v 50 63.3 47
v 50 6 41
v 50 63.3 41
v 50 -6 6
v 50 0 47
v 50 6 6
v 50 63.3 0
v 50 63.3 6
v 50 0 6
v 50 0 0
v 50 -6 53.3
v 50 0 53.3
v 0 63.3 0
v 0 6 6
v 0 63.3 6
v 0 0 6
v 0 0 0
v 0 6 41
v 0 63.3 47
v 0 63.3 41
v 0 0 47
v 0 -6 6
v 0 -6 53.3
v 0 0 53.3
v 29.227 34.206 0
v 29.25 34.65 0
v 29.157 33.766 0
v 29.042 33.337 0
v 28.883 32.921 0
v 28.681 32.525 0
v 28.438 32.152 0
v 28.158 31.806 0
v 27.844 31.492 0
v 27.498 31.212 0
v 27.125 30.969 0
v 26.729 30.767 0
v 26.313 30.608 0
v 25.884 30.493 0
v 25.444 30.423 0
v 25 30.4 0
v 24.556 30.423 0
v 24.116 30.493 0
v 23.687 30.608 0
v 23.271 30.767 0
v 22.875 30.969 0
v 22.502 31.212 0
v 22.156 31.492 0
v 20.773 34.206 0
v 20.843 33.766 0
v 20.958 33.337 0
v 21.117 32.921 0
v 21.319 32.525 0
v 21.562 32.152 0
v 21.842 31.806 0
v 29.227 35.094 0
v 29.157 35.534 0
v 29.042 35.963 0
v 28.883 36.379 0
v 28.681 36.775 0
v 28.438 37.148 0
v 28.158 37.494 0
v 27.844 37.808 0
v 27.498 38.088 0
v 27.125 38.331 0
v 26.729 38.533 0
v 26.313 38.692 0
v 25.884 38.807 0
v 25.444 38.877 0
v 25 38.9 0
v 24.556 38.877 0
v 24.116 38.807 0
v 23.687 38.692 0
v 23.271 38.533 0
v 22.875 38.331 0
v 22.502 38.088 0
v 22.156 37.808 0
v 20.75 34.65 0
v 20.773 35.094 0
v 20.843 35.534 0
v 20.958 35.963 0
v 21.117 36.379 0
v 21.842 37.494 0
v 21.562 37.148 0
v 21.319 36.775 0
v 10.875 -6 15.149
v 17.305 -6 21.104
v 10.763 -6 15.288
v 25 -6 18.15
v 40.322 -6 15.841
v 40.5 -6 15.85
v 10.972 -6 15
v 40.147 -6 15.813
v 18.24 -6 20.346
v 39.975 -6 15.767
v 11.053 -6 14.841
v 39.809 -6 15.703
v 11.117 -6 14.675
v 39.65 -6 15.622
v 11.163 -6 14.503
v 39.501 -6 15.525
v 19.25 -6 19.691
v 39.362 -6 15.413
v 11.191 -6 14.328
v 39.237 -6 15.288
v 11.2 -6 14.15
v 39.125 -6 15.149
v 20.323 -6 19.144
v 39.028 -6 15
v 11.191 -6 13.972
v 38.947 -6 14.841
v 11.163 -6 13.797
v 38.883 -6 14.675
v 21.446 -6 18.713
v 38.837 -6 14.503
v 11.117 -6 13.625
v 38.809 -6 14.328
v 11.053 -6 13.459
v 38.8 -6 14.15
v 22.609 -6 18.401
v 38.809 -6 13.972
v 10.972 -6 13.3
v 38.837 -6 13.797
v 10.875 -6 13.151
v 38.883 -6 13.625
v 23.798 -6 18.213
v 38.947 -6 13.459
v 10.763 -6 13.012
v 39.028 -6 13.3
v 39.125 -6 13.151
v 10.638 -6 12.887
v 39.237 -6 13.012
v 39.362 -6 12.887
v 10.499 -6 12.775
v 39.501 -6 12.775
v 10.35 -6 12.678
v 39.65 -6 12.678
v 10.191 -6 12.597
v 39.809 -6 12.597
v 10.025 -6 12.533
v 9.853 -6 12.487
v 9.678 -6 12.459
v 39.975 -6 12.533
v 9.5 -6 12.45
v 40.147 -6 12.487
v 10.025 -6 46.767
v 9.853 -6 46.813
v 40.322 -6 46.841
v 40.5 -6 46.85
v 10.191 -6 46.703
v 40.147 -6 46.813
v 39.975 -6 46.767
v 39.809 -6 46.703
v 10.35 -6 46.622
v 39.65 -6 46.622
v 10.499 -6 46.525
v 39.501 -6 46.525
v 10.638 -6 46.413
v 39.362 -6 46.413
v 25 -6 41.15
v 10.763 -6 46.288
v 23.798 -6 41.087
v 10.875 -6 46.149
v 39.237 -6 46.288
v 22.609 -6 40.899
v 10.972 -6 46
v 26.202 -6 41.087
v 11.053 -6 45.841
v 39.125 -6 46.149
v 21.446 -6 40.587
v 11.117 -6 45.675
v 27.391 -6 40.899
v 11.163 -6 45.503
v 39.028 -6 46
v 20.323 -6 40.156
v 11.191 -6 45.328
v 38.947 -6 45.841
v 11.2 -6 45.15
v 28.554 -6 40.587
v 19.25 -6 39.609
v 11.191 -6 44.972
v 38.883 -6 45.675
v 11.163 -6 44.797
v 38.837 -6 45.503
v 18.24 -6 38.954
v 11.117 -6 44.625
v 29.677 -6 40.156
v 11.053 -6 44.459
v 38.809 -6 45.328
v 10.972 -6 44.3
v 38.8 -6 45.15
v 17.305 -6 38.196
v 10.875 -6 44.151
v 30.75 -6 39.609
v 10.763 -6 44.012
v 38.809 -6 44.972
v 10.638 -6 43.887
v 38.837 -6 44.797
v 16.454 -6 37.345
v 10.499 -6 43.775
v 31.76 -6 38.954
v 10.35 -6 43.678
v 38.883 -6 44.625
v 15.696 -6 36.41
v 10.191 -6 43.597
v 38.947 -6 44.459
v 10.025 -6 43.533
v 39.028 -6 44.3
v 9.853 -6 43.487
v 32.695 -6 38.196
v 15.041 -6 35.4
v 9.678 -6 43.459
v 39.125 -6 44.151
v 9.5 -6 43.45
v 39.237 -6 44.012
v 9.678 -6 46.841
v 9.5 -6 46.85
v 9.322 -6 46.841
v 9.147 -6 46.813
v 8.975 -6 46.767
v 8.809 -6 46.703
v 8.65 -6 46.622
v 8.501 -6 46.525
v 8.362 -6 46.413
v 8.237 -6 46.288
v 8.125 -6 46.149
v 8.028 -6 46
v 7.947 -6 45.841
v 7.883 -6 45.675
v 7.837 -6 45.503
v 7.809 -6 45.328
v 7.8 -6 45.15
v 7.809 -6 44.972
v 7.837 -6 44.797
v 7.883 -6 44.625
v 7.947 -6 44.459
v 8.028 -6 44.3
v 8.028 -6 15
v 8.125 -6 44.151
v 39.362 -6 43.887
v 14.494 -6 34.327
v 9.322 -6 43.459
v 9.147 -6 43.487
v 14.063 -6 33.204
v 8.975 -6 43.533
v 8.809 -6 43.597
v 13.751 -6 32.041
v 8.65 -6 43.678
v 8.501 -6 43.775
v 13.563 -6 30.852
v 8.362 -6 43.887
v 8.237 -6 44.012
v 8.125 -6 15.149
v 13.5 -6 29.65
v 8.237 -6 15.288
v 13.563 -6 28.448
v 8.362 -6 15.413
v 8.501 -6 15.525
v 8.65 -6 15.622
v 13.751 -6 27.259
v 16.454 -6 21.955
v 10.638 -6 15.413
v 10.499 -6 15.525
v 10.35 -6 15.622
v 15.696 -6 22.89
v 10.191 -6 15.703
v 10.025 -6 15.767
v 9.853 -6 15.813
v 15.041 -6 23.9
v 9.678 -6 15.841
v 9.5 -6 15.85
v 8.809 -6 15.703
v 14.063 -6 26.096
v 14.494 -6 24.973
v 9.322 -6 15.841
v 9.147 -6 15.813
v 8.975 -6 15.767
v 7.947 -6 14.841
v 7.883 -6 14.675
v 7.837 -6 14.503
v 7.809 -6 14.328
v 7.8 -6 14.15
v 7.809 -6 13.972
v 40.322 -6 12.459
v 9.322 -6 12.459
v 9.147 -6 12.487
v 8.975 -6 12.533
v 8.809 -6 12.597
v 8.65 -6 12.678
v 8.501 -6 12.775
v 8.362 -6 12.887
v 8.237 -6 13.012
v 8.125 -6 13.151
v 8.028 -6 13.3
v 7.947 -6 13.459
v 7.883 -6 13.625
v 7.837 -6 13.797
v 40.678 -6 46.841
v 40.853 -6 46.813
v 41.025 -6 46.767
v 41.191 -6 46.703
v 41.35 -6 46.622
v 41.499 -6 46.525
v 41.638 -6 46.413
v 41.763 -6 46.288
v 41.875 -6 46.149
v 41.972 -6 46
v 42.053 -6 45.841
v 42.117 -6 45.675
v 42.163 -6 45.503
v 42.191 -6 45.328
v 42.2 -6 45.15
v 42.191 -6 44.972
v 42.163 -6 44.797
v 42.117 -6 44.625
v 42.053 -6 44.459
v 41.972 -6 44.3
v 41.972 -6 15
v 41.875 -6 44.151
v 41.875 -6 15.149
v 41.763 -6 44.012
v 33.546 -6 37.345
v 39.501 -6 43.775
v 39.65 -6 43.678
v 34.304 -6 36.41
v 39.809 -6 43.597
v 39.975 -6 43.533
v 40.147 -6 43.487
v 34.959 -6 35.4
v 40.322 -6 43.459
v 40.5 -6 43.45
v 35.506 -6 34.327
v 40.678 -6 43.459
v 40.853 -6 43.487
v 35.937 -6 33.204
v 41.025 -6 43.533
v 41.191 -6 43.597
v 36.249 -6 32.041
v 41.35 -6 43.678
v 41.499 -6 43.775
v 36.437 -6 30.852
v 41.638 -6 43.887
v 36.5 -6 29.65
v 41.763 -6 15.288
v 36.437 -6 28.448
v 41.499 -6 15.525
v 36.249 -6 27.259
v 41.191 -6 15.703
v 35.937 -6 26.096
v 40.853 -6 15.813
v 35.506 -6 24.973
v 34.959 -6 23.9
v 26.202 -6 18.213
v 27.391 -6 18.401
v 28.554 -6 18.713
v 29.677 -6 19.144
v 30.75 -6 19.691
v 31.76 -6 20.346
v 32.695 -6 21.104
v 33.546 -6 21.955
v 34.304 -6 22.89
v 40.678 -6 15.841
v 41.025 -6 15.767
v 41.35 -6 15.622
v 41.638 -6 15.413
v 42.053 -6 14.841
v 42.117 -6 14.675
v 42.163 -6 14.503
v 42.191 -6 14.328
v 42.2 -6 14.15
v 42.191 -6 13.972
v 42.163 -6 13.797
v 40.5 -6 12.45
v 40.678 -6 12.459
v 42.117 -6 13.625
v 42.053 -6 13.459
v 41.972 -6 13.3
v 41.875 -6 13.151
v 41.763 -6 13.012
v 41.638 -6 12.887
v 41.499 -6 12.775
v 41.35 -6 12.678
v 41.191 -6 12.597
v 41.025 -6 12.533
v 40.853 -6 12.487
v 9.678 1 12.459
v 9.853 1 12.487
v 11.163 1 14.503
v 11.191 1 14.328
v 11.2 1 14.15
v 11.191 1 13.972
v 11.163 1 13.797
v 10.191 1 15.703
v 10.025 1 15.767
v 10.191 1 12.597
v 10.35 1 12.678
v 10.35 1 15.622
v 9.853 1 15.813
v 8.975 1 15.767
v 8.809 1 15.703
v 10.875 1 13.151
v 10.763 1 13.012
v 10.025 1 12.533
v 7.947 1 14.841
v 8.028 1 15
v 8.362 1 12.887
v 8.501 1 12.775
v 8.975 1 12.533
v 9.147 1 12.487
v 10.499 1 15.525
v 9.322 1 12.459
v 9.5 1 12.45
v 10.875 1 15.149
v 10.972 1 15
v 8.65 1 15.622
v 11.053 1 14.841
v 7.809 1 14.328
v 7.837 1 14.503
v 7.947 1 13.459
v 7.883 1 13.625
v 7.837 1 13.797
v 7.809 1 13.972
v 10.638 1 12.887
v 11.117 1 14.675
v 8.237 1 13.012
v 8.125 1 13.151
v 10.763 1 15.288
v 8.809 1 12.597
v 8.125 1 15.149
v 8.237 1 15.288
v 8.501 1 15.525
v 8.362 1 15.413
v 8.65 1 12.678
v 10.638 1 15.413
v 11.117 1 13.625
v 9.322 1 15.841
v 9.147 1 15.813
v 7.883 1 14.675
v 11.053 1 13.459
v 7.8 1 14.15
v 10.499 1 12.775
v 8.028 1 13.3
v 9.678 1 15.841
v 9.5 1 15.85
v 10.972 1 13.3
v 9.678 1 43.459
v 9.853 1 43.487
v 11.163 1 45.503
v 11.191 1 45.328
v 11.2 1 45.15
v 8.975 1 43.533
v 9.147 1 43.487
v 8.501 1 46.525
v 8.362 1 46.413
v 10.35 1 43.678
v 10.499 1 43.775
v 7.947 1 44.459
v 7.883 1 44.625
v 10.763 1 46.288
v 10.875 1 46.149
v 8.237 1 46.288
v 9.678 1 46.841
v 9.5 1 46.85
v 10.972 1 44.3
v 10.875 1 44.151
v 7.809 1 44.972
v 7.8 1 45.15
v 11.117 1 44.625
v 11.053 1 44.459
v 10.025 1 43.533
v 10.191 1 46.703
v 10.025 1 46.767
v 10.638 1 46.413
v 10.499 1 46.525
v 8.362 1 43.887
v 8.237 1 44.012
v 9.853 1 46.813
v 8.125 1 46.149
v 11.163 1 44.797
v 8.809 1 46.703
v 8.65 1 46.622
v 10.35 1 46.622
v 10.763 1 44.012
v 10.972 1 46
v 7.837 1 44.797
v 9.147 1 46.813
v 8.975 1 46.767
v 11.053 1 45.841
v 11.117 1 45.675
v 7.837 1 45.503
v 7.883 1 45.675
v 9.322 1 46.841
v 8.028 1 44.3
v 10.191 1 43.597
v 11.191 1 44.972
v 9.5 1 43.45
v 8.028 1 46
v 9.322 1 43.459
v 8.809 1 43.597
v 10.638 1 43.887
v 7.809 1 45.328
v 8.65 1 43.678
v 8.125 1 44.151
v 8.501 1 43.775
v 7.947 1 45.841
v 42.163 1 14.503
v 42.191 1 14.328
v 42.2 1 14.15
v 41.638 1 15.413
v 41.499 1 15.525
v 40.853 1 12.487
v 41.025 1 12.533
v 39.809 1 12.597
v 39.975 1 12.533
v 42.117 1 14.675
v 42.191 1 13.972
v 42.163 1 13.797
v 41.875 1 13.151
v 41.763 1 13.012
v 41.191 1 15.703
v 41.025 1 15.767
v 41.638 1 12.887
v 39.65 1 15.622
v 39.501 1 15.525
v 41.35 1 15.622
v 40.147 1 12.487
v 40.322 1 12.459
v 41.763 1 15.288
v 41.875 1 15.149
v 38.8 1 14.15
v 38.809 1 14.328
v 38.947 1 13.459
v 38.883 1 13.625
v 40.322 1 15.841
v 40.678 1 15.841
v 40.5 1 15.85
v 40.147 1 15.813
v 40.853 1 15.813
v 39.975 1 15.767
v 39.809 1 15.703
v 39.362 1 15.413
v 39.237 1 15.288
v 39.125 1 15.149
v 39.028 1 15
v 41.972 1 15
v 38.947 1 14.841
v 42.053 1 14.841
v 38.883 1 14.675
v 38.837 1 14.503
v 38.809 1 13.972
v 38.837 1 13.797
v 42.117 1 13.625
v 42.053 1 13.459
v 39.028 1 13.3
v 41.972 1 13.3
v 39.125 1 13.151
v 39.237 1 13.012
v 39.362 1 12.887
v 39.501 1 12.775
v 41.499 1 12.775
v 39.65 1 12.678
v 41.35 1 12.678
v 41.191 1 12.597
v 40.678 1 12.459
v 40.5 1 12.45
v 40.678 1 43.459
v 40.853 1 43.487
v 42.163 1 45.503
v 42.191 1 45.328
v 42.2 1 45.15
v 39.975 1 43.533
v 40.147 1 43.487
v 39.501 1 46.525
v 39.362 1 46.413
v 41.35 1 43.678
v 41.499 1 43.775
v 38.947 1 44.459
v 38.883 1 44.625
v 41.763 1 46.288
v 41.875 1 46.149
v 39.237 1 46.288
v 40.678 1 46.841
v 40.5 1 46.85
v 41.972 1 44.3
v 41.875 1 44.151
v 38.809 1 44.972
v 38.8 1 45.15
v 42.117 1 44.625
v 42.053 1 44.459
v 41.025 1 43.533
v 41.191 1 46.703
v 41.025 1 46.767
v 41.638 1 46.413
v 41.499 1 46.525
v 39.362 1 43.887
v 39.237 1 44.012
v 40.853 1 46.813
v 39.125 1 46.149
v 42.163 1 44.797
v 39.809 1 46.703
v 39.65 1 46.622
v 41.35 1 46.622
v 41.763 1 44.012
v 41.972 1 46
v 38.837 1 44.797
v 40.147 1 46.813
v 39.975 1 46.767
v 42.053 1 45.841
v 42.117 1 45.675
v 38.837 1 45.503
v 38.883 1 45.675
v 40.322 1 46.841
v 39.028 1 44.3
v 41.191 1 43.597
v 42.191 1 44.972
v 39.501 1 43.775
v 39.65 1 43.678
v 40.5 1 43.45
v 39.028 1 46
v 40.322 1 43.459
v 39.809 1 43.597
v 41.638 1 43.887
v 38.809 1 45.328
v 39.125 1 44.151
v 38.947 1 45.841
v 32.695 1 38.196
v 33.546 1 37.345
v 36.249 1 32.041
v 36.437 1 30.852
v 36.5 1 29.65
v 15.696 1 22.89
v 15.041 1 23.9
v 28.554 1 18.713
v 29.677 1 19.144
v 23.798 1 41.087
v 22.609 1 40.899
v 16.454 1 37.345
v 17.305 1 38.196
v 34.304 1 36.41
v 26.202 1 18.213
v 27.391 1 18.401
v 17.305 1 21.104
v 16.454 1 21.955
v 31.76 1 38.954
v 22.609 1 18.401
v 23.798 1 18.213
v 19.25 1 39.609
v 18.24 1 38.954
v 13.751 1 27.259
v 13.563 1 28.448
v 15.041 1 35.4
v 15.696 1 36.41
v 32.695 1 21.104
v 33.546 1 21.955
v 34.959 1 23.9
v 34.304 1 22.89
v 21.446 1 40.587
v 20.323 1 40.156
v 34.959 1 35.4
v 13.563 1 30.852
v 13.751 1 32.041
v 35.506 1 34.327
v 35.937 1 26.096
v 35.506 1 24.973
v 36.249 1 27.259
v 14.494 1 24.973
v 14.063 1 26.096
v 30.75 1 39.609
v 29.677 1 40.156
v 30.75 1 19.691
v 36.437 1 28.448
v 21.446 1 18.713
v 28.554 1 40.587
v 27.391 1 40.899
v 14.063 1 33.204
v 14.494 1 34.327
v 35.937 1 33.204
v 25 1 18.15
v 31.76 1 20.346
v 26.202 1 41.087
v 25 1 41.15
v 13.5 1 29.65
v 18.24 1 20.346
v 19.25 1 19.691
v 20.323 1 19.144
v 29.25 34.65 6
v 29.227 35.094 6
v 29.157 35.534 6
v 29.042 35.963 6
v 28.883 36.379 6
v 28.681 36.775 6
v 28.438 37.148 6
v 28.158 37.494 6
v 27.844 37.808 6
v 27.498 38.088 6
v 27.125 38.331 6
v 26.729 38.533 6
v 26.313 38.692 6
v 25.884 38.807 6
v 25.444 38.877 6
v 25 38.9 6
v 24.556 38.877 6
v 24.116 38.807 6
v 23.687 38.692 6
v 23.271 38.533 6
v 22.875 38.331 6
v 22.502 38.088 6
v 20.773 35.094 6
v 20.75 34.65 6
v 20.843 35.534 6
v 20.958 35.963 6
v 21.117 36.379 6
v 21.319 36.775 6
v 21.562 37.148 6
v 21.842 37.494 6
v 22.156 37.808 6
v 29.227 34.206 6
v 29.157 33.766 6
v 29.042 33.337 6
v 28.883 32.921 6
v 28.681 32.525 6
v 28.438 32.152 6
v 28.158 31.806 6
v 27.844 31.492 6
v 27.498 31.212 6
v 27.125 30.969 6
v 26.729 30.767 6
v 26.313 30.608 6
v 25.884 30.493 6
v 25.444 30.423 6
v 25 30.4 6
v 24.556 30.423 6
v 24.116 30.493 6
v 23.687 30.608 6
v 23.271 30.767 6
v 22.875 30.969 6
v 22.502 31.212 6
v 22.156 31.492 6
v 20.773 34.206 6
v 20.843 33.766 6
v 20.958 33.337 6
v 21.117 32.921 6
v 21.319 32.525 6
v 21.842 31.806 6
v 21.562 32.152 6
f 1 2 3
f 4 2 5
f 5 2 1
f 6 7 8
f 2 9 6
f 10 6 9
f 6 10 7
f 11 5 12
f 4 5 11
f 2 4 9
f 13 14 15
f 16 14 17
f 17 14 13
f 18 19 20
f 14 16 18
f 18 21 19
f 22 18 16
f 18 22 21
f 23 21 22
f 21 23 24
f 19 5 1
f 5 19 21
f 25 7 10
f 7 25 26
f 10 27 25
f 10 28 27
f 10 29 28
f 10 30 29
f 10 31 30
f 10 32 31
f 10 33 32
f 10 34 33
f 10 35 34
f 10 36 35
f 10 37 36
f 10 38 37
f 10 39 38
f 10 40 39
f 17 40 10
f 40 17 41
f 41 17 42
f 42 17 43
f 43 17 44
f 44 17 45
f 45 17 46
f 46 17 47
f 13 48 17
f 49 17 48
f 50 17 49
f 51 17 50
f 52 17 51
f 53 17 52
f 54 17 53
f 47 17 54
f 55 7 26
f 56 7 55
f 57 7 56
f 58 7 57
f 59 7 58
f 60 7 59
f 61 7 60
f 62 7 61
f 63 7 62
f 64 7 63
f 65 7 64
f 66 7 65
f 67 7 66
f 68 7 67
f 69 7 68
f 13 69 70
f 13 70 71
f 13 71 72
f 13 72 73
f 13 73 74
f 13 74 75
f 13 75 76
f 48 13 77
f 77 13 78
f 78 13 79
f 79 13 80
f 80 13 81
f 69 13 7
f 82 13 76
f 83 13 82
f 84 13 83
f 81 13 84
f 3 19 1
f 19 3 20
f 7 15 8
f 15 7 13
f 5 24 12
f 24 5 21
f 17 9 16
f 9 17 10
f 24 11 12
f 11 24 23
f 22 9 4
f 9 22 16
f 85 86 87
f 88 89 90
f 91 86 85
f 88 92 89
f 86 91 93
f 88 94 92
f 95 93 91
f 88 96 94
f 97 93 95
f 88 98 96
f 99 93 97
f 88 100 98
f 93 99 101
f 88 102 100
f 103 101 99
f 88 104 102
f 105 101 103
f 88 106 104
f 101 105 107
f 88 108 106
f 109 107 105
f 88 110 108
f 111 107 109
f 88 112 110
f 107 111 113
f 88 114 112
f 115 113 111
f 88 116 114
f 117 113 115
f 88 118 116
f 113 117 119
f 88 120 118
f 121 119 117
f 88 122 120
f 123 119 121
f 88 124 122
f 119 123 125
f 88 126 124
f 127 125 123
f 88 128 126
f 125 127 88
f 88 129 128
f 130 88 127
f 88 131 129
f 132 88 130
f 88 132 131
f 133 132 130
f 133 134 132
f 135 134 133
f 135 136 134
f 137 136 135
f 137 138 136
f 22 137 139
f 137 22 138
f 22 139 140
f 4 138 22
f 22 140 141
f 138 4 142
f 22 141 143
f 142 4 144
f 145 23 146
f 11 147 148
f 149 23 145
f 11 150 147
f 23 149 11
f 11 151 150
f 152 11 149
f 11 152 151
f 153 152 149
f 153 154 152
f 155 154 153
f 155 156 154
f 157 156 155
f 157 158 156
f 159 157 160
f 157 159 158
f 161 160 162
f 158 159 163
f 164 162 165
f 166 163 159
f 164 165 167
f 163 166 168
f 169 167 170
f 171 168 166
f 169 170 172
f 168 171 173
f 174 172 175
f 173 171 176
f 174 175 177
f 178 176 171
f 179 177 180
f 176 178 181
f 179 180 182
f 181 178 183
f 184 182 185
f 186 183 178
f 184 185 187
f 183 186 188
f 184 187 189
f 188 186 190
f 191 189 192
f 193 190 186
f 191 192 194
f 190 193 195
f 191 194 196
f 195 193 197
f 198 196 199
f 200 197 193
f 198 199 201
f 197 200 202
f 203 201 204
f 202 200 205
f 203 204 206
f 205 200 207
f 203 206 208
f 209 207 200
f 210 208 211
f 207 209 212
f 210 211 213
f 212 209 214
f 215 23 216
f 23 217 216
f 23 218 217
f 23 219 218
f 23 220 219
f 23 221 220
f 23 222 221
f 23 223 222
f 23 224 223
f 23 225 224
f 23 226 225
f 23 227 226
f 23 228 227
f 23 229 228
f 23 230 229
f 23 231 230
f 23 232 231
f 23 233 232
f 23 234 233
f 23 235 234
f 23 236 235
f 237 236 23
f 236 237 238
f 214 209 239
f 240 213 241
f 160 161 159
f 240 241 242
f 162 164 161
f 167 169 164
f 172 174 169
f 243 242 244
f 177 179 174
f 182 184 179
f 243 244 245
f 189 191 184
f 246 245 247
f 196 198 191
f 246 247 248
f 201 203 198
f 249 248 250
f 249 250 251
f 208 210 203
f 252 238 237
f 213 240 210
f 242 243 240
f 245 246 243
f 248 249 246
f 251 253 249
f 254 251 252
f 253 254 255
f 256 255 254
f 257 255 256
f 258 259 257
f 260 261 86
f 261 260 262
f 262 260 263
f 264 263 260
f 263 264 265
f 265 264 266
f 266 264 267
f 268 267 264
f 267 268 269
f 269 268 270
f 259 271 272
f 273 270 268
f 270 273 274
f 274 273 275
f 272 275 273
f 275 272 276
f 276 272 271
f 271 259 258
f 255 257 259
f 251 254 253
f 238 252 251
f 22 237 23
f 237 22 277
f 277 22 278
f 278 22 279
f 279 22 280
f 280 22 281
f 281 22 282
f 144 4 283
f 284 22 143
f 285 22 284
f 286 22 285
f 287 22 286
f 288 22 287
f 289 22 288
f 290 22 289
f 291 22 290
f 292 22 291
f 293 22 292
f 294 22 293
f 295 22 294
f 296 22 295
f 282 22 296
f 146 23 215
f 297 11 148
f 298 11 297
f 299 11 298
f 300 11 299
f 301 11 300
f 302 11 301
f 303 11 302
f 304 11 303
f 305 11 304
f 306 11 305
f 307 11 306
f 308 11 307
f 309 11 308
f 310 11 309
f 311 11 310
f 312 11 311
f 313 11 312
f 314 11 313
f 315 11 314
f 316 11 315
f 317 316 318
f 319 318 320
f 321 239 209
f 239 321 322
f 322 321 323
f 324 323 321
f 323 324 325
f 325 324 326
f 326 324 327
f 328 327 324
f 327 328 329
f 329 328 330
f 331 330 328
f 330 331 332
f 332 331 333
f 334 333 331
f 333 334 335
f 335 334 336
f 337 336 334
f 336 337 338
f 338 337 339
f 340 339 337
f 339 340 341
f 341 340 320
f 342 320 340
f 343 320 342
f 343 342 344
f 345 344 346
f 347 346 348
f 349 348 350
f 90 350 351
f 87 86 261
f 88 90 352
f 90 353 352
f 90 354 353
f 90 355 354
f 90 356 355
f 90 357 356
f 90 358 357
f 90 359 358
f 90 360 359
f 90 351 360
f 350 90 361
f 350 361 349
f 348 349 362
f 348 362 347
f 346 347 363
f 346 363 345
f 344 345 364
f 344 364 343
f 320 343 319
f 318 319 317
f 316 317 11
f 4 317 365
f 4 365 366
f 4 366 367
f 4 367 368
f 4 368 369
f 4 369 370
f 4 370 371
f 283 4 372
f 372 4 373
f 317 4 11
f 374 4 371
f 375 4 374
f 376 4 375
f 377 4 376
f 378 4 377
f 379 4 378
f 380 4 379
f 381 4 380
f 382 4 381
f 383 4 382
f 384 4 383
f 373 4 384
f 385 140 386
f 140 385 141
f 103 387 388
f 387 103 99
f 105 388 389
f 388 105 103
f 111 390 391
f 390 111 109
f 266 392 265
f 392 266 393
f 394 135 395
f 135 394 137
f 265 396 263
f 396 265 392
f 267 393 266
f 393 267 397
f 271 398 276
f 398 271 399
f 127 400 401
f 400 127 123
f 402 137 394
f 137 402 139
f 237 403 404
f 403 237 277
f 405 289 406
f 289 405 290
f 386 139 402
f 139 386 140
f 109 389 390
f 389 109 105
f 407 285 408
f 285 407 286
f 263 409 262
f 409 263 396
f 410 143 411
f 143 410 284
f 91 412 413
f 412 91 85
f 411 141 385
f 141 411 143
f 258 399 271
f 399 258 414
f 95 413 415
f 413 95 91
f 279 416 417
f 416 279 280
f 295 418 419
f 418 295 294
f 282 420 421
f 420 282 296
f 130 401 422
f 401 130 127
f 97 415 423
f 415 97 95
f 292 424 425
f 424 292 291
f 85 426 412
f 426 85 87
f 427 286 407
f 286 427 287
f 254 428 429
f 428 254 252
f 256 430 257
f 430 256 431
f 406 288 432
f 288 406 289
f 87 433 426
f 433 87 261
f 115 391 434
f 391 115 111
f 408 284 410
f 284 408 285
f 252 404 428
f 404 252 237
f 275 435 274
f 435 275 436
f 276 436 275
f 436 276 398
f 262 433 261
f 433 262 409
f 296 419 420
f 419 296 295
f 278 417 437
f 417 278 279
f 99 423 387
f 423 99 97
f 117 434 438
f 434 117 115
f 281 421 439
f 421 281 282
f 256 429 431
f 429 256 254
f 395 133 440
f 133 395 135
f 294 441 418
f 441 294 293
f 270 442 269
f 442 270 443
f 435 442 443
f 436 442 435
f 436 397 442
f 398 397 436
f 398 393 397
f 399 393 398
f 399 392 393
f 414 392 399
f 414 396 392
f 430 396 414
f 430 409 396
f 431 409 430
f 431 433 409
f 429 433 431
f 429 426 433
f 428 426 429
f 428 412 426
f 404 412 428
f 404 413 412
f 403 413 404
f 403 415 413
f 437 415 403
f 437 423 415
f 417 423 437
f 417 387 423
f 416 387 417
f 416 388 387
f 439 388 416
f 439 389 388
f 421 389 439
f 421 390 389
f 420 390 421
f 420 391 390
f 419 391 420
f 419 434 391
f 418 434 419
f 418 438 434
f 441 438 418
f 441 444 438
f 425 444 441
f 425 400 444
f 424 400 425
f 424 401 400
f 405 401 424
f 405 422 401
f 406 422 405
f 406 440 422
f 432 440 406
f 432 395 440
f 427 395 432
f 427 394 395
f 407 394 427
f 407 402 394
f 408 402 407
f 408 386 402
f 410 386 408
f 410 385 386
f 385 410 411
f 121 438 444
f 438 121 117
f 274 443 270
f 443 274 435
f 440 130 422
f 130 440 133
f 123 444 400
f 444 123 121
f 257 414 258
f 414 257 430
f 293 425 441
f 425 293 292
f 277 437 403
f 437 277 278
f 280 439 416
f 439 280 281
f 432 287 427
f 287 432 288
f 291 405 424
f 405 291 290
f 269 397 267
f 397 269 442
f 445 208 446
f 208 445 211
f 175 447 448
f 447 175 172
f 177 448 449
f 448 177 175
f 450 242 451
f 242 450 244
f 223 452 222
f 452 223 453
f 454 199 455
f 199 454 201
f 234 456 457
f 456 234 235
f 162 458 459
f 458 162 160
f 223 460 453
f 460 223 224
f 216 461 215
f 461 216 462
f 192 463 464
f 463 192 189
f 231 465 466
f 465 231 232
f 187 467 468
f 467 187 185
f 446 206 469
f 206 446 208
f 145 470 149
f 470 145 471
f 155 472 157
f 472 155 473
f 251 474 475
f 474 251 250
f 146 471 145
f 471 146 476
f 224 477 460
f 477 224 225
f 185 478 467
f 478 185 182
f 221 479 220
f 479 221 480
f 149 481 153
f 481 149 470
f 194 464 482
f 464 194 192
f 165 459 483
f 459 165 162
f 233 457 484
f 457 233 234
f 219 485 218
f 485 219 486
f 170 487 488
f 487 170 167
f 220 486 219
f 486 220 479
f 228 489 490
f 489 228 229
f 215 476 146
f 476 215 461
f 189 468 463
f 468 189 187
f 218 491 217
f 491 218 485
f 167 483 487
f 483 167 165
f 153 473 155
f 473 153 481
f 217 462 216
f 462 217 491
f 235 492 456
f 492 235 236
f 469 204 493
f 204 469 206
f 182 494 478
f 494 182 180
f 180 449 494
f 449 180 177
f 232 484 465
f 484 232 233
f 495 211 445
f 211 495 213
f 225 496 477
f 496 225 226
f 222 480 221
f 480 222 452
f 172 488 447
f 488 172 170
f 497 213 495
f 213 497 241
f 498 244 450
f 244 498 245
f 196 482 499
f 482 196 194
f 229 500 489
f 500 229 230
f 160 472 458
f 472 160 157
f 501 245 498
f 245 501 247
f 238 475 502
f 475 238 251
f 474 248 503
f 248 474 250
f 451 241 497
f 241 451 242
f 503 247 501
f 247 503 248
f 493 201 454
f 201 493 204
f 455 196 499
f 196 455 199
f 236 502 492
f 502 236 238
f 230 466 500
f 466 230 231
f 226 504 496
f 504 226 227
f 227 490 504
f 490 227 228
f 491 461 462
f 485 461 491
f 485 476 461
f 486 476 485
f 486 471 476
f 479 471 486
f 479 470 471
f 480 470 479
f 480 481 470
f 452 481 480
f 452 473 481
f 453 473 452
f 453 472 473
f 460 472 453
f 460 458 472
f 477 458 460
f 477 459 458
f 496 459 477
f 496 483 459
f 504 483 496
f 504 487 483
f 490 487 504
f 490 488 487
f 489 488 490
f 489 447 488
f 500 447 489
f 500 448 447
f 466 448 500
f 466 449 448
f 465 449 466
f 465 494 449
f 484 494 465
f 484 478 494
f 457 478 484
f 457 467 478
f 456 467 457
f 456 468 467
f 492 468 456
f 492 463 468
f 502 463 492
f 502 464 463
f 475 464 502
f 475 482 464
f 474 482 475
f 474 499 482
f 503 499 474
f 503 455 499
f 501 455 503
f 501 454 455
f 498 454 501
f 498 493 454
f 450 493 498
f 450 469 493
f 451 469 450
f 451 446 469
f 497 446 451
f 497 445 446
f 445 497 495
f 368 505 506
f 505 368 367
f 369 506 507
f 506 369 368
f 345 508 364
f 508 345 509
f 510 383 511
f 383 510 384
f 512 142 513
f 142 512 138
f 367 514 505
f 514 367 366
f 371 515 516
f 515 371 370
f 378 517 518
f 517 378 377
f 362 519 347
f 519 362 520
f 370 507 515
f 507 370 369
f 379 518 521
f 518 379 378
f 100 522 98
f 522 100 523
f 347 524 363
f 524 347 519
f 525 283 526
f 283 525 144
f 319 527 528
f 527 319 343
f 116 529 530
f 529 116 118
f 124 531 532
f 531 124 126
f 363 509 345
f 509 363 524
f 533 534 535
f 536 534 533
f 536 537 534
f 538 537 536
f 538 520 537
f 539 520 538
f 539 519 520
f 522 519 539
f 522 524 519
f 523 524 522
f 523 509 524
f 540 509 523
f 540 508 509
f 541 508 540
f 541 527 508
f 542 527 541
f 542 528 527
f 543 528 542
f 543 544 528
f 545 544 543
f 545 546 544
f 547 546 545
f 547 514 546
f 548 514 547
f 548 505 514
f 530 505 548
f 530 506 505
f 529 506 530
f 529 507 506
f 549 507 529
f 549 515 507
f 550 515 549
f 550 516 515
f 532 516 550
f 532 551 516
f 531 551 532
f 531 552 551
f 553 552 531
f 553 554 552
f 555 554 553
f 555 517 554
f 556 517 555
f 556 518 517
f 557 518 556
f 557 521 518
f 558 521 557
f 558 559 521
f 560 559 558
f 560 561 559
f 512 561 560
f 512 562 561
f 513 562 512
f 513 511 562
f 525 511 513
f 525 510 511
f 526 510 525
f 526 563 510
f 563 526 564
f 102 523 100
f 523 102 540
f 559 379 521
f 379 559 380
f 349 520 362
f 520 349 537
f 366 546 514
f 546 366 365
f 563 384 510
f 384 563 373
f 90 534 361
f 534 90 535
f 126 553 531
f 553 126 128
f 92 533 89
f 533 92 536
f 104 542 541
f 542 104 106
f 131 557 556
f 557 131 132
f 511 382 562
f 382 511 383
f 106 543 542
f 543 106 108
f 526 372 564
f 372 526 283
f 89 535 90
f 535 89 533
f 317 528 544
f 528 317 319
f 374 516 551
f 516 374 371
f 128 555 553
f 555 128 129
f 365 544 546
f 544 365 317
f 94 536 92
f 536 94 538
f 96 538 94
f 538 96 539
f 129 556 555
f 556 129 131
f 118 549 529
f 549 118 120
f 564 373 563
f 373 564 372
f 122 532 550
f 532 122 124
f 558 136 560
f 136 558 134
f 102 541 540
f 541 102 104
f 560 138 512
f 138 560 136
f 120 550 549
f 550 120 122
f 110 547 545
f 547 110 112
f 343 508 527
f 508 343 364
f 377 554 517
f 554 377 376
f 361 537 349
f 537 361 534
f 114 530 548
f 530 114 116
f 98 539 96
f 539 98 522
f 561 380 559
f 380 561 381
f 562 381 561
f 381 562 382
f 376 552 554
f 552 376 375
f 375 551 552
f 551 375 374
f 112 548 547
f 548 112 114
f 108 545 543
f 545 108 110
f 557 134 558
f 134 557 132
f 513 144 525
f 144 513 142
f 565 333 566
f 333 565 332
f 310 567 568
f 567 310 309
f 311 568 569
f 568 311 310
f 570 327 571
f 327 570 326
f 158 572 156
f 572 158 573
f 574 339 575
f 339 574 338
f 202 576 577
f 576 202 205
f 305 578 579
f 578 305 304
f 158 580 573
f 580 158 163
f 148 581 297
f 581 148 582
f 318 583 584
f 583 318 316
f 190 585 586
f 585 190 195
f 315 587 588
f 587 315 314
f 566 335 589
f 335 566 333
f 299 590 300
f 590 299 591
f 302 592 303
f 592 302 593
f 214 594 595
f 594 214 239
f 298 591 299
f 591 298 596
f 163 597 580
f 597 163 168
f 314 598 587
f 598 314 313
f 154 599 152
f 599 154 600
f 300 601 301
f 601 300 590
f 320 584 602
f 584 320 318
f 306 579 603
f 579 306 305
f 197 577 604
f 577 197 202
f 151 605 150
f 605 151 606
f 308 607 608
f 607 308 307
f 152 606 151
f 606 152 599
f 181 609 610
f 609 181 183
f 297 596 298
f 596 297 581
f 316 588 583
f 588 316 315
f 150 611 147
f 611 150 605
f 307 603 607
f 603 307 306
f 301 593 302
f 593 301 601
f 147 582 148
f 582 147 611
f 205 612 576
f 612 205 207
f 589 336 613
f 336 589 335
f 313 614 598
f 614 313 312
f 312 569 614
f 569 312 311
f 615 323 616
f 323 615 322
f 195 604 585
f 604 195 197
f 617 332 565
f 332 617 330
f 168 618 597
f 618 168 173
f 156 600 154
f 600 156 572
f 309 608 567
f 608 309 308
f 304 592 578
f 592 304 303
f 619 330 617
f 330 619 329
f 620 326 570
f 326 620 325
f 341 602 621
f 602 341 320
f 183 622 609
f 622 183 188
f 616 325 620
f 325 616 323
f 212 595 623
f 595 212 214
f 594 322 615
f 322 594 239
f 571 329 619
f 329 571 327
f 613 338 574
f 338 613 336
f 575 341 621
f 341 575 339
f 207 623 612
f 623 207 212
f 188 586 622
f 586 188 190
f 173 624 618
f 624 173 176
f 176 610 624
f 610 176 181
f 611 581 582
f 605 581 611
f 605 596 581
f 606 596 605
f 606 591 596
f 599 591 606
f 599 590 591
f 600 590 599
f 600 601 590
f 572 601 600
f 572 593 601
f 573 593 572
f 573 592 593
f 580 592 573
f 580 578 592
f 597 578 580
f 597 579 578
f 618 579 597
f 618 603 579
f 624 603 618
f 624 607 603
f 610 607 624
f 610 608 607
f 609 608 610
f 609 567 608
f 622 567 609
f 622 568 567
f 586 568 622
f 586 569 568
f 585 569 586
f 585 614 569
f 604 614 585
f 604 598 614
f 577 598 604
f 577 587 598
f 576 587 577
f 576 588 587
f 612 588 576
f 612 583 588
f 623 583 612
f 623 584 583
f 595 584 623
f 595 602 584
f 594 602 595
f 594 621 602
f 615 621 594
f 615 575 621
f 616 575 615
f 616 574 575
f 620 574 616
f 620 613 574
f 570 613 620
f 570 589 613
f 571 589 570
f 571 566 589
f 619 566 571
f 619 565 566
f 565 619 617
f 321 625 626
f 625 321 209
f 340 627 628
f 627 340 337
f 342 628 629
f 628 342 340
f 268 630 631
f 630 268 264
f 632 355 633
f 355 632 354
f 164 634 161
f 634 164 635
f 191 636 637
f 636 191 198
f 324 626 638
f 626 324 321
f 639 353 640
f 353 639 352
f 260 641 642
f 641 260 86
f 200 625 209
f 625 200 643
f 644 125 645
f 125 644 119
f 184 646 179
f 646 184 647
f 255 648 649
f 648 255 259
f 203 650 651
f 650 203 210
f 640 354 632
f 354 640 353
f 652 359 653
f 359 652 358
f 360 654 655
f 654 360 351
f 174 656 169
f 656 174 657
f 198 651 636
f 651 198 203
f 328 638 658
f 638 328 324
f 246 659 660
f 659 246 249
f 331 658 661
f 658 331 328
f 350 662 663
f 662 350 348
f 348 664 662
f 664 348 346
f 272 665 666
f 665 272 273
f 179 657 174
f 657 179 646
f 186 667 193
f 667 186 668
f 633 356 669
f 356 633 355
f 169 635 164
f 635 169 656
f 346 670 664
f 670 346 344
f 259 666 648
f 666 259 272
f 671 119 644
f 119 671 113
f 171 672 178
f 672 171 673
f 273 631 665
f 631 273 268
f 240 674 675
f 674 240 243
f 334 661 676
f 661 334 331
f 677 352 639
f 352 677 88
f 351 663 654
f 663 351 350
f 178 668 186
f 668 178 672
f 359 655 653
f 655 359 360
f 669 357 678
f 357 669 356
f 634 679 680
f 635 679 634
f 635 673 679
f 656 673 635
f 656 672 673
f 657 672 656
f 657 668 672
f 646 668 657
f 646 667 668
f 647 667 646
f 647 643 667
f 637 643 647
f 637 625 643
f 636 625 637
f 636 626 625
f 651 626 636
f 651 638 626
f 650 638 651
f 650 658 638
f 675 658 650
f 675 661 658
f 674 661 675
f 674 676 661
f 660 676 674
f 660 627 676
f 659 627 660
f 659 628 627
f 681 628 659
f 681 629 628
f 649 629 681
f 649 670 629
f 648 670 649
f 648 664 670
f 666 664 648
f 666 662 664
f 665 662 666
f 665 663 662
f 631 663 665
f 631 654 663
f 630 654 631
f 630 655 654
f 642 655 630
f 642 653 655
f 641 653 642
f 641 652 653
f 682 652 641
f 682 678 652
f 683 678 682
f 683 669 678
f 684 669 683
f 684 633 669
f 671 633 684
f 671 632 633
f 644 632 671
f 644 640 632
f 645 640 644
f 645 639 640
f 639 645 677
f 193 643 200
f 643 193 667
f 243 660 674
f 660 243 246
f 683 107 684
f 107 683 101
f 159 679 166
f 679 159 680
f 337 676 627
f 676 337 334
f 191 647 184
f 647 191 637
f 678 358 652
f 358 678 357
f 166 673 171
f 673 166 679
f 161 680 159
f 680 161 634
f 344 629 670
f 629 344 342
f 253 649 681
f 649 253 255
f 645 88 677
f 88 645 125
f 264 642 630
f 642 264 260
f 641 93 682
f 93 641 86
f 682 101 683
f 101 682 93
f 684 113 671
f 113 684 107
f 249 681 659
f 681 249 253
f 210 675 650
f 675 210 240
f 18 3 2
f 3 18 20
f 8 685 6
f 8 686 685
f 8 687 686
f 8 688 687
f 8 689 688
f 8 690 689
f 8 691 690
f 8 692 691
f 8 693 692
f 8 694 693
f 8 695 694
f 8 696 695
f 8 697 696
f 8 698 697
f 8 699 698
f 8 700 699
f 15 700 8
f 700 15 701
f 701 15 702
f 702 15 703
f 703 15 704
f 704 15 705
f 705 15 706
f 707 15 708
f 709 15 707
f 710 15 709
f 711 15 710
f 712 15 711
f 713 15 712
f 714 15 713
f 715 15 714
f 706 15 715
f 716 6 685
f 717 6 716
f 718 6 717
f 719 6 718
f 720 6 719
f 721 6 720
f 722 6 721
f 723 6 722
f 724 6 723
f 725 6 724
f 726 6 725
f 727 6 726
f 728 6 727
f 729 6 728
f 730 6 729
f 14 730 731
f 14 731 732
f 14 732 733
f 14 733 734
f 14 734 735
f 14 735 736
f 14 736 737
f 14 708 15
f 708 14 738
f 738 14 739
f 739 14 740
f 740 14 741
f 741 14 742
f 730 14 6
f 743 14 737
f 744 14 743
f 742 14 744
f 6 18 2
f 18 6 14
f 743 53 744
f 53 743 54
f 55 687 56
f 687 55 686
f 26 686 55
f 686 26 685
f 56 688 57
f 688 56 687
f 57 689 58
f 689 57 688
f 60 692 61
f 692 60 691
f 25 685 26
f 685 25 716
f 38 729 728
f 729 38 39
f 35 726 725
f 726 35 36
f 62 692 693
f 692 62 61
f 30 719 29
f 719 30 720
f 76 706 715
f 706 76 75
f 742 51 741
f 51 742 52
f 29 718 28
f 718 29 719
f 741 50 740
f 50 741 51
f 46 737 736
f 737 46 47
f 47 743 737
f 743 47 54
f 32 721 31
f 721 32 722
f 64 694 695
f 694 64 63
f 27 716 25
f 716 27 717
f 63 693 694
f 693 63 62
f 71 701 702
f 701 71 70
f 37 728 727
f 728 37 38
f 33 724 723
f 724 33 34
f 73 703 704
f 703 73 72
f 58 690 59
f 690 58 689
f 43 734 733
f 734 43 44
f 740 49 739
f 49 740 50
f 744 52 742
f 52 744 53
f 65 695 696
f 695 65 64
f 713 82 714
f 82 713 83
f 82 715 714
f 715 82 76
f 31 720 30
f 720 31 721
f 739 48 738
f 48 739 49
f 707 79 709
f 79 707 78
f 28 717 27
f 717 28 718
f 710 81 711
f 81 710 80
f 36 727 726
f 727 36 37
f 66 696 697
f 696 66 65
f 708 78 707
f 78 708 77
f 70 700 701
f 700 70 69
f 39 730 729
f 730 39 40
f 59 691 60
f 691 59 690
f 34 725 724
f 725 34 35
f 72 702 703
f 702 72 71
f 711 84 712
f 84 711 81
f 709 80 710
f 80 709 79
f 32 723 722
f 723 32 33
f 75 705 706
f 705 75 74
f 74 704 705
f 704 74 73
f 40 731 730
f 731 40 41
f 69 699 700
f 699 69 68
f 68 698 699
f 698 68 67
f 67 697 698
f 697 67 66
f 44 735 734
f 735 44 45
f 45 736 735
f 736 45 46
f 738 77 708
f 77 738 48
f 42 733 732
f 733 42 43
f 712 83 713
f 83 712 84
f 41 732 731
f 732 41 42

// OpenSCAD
// ============================================================
// GÁ KẸP BÀN ĐỘNG CƠ NEMA 17 (NẰM NGANG)
// Thiết kế tối ưu cho in 3D (không cần support khi đặt nằm nghiêng)
// ============================================================

/* --- HƯỚNG DẪN ---
1. Điều chỉnh thông số "ban_day_max" cho phù hợp với bàn của bạn.
2. Khi in 3D: Xoay vật thể 90 độ quanh trục Y (để mặt bên áp xuống bàn in).
   Điều này giúp in không cần support và kết cấu cứng nhất.
3. Bạn cần chuẩn bị:
   - 4 ốc M3 ngắn để bắt motor vào gá.
   - 1 bu lông lớn (M8 hoặc M10) + đai ốc để làm chân kẹp.
*/

// --- THÔNG SỐ CẤU HÌNH (Đơn vị: mm) ---

// Thông số bàn và kẹp
ban_day_max = 35;       // Độ dày tối đa của mặt bàn có thể kẹp
do_day_tuong = 6;       // Độ dày của thành gá (nên để >= 5mm cho cứng)
be_rong_ga = 50;        // Bề rộng tổng thể của gá
duong_kinh_oc_kep = 8.5; // Đường kính lỗ cho ốc kẹp (Ví dụ M8 thì để 8.5mm cho lỏng)

// Thông số chuẩn NEMA 17 (Không nên sửa trừ khi dùng motor lạ)
nema_side = 42.3;       // Kích thước cạnh mặt bích motor
lo_bat_oc_motor = 31;   // Khoảng cách tâm 2 lỗ ốc đối diện (chéo) là 43.8, cạnh là 31
duong_kinh_hub = 23;    // Đường kính lỗ thoát gờ định vị giữa motor (chuẩn 22mm, để 23 cho lỏng)
duong_kinh_oc_m3 = 3.4; // Lỗ xỏ vừa ốc M3

$fn = 60; // Độ mịn đường tròn

// ============================================================
// MODULE CHÍNH
// ============================================================

module ga_kep_ban_nema17() {
    // Tính toán các kích thước bao
    chieu_cao_tong = ban_day_max + 2 * do_day_tuong;
    chieu_sau_kep = nema_side + 15; // Phần ăn vào mặt bàn

    difference() {
        // 1. Khối vật liệu chính (Hình chữ C)
        union() {
            // Khối thân chính
            cube([be_rong_ga, chieu_sau_kep + do_day_tuong, chieu_cao_tong]);
            
            // Khối mặt bích để gắn motor (phía trước)
            translate([0, -do_day_tuong, do_day_tuong]) {
                // Tạo khối vuông vức trước
                 cube([be_rong_ga, do_day_tuong, nema_side + 5]);
            }
            
             // Bo tròn góc chịu lực (Fillet) giữa mặt gắn motor và thân kẹp
             // Đây là phần quan trọng để tránh bị gãy khi siết ốc
            translate([0, do_day_tuong, do_day_tuong + ban_day_max])
                rotate([0, 90, 0])
                fillet_concave(r=do_day_tuong, l=be_rong_ga);
             
            translate([0, do_day_tuong, do_day_tuong])
                rotate([0, 90, 0])
                rotate([0,0,-90])
                fillet_concave(r=do_day_tuong, l=be_rong_ga);
        }

        // --- CÁC PHẦN CẮT BỎ ---
        
        // 2. Khe hở để đút vào mặt bàn
        translate([-1, do_day_tuong, do_day_tuong])
            cube([be_rong_ga + 2, chieu_sau_kep + 1, ban_day_max]);

        // 3. Các lỗ bắt động cơ NEMA 17 (Ở mặt trước)
        translate([be_rong_ga/2, -do_day_tuong/2, do_day_tuong + nema_side/2 + 2.5])
        rotate([90, 0, 0]) // Xoay để đục lỗ nằm ngang
        {
            // Lỗ Hub giữa
            cylinder(h = do_day_tuong + 2, d = duong_kinh_hub, center=true);
            
            // 4 lỗ ốc M3 ở góc
            for (x_pos = [-1, 1]) {
                for (y_pos = [-1, 1]) {
                    translate([x_pos * lo_bat_oc_motor/2, y_pos * lo_bat_oc_motor/2, 0])
                        cylinder(h = do_day_tuong + 2, d = duong_kinh_oc_m3, center=true);
                }
            }
        }
        
        // 4. Lỗ cho bu lông kẹp bàn (Ở mặt dưới)
        // Vị trí: nằm giữa bề rộng, và cách mép trong một khoảng
        translate([be_rong_ga/2, do_day_tuong + chieu_sau_kep/2 , -1])
            cylinder(h = do_day_tuong + 2, d = duong_kinh_oc_kep);
    }
}

// Module phụ trợ để tạo góc bo tròn âm (Concave Fillet)
// Giúp tăng cường độ cứng vững cho các góc vuông
module fillet_concave(r, l) {
    difference() {
        cube([r, r, l]);
        translate([r, r, -1])
            cylinder(h=l+2, r=r);
    }
}


// === GỌI MODULE ĐỂ HIỂN THỊ ===

// Gợi ý: Bỏ comment dòng rotate bên dưới để xem hướng in 3D tối ưu
// rotate([0, -90, 0]) 
ga_kep_ban_nema17();

// Bonus: Một miếng đệm nhỏ để lót đầu ốc kẹp, tránh làm hỏng mặt bàn
/*
translate([be_rong_ga + 20, 0, 0])
difference() {
    cylinder(h=3, d=20); // Miếng đệm tròn đường kính 20mm
    translate([0,0,1.5])
        cylinder(h=2, d=duong_kinh_oc_kep+0.5, $fn=6); // Lỗ lục giác để giữ đầu đai ốc (nếu cần)
}
*/
